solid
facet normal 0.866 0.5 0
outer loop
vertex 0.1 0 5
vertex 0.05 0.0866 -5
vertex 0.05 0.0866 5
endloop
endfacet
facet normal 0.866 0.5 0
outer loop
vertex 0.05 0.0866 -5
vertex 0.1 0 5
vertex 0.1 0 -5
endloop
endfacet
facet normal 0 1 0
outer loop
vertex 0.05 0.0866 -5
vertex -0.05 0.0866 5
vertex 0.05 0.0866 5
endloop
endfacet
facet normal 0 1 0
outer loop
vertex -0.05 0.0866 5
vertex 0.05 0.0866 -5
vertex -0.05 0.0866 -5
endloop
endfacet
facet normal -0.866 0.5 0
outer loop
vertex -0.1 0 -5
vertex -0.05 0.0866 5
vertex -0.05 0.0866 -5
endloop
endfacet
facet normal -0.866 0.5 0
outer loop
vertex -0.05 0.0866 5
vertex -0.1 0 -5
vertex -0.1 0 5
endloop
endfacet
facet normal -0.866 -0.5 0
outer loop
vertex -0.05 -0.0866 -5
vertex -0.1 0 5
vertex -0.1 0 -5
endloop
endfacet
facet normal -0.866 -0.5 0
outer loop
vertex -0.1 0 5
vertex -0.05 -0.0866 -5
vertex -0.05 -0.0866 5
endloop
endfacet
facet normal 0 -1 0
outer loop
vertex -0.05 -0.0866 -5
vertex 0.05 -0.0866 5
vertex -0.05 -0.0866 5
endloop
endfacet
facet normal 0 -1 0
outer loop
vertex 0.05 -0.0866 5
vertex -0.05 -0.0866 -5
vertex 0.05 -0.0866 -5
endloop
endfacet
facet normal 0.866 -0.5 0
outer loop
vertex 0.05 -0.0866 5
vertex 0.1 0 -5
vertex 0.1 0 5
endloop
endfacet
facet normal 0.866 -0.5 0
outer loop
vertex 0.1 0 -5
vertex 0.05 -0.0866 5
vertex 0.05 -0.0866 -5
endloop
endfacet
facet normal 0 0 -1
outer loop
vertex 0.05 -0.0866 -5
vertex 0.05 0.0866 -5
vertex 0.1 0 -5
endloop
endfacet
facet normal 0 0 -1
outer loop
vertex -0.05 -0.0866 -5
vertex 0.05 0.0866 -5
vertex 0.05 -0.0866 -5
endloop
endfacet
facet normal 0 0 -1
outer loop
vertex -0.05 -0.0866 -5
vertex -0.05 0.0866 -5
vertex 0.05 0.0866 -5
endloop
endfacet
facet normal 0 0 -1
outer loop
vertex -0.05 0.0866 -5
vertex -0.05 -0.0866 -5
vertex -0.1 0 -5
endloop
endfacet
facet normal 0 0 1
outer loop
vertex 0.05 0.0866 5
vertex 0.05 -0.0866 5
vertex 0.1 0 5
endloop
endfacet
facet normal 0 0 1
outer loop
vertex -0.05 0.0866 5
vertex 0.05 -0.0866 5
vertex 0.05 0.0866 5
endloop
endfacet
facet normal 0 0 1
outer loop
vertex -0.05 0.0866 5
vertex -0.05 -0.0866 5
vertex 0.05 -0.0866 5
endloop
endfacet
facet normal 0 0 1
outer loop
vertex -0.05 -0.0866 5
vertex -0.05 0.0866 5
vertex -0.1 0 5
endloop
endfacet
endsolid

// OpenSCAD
module example001()
{
	function r_from_dia(d) = d / 2;

	module rotcy(rot, r, h) {
		rotate(90, rot)
			cylinder(r = r, h = h, center = true);
	}

	difference() {
		rotcy([0, 0, 0], cy_r+5, cy_h);
		rotcy([0, 0, 0], cy_r, cy_h+1);
	}

	size = 25;
	hole = 28;
	sizeG = 5;
	union(){
		translate([0, 0, -size/2+sizeG/2])
		cube([sizeG, hole*2-1+5, sizeG], center = true);
		rotate(90,[0,0,1])
		translate([0, 0, -size/2+sizeG/2])
		cube([sizeG, hole*2-1+5, sizeG], center = true);
	}
	cy_r = r_from_dia(hole);
	cy_h = size;
}

//example001();

r1=0.1;
h1=10;
$fn=6;
cylinder(r = r1, h = h1, center = true);

	
